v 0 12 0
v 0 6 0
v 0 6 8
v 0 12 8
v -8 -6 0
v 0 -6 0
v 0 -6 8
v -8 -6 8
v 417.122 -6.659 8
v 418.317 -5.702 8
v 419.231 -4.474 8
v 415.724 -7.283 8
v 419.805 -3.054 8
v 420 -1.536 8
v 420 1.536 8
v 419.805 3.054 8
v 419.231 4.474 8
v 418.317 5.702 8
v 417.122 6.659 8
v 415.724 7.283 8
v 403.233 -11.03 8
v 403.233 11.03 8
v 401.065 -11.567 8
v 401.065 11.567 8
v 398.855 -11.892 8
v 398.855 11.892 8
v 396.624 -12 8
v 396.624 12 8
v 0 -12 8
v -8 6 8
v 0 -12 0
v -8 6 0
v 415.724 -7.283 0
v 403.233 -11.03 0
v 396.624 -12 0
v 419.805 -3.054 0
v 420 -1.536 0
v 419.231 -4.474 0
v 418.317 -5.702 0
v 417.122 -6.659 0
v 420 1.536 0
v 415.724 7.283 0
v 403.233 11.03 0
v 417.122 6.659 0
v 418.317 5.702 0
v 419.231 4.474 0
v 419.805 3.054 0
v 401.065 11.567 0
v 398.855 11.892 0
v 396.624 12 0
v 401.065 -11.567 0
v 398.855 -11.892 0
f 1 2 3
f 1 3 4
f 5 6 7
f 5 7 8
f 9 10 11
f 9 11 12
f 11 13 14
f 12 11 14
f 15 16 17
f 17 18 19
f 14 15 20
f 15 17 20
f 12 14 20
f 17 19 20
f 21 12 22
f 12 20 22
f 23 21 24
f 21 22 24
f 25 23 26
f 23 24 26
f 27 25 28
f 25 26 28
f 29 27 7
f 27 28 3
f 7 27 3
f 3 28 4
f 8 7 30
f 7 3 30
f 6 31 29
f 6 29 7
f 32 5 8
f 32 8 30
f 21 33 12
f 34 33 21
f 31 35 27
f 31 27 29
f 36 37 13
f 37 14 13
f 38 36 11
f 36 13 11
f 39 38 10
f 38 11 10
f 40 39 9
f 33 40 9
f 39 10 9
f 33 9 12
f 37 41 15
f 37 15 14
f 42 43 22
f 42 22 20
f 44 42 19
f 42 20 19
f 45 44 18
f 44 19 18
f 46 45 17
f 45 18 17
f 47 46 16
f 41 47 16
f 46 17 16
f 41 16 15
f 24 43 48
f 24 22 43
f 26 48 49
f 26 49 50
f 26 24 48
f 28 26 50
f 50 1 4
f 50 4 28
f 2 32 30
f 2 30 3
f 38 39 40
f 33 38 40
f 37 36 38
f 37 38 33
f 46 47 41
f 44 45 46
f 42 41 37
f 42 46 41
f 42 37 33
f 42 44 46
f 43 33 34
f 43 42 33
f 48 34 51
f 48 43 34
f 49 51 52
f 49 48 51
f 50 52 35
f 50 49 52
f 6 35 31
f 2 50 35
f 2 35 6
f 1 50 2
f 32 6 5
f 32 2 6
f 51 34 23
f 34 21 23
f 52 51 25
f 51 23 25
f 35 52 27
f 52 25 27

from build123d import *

# Parameters (mm, degrees)
PAD_DEPTH   = 8
FILLET_R    = 6
FILLET001_R = 23


with BuildPart() as part:
    # Sketch → Pad (new body)
    with BuildSketch(Plane.XY):
        Polygon((-8, 6), (0, 6), (0, 12), (400, 12), (420, 6), (420, -6), (400, -12), (0, -12), (0, -6), (-8, -6), align=None)
    extrude(amount=PAD_DEPTH)

    # Fillet
    fillet_edges = [part.edges().sort_by_distance(p)[0] for p in [
        (420, -6, 4),
        (420, 6, 4),
    ]]
    fillet(fillet_edges, radius=FILLET_R)

    # Fillet001
    fillet001_edges = [part.edges().sort_by_distance(p)[0] for p in [
        (400, 12, 4),
        (400, -12, 4),
    ]]
    fillet(fillet001_edges, radius=FILLET001_R)


solid = part.part
